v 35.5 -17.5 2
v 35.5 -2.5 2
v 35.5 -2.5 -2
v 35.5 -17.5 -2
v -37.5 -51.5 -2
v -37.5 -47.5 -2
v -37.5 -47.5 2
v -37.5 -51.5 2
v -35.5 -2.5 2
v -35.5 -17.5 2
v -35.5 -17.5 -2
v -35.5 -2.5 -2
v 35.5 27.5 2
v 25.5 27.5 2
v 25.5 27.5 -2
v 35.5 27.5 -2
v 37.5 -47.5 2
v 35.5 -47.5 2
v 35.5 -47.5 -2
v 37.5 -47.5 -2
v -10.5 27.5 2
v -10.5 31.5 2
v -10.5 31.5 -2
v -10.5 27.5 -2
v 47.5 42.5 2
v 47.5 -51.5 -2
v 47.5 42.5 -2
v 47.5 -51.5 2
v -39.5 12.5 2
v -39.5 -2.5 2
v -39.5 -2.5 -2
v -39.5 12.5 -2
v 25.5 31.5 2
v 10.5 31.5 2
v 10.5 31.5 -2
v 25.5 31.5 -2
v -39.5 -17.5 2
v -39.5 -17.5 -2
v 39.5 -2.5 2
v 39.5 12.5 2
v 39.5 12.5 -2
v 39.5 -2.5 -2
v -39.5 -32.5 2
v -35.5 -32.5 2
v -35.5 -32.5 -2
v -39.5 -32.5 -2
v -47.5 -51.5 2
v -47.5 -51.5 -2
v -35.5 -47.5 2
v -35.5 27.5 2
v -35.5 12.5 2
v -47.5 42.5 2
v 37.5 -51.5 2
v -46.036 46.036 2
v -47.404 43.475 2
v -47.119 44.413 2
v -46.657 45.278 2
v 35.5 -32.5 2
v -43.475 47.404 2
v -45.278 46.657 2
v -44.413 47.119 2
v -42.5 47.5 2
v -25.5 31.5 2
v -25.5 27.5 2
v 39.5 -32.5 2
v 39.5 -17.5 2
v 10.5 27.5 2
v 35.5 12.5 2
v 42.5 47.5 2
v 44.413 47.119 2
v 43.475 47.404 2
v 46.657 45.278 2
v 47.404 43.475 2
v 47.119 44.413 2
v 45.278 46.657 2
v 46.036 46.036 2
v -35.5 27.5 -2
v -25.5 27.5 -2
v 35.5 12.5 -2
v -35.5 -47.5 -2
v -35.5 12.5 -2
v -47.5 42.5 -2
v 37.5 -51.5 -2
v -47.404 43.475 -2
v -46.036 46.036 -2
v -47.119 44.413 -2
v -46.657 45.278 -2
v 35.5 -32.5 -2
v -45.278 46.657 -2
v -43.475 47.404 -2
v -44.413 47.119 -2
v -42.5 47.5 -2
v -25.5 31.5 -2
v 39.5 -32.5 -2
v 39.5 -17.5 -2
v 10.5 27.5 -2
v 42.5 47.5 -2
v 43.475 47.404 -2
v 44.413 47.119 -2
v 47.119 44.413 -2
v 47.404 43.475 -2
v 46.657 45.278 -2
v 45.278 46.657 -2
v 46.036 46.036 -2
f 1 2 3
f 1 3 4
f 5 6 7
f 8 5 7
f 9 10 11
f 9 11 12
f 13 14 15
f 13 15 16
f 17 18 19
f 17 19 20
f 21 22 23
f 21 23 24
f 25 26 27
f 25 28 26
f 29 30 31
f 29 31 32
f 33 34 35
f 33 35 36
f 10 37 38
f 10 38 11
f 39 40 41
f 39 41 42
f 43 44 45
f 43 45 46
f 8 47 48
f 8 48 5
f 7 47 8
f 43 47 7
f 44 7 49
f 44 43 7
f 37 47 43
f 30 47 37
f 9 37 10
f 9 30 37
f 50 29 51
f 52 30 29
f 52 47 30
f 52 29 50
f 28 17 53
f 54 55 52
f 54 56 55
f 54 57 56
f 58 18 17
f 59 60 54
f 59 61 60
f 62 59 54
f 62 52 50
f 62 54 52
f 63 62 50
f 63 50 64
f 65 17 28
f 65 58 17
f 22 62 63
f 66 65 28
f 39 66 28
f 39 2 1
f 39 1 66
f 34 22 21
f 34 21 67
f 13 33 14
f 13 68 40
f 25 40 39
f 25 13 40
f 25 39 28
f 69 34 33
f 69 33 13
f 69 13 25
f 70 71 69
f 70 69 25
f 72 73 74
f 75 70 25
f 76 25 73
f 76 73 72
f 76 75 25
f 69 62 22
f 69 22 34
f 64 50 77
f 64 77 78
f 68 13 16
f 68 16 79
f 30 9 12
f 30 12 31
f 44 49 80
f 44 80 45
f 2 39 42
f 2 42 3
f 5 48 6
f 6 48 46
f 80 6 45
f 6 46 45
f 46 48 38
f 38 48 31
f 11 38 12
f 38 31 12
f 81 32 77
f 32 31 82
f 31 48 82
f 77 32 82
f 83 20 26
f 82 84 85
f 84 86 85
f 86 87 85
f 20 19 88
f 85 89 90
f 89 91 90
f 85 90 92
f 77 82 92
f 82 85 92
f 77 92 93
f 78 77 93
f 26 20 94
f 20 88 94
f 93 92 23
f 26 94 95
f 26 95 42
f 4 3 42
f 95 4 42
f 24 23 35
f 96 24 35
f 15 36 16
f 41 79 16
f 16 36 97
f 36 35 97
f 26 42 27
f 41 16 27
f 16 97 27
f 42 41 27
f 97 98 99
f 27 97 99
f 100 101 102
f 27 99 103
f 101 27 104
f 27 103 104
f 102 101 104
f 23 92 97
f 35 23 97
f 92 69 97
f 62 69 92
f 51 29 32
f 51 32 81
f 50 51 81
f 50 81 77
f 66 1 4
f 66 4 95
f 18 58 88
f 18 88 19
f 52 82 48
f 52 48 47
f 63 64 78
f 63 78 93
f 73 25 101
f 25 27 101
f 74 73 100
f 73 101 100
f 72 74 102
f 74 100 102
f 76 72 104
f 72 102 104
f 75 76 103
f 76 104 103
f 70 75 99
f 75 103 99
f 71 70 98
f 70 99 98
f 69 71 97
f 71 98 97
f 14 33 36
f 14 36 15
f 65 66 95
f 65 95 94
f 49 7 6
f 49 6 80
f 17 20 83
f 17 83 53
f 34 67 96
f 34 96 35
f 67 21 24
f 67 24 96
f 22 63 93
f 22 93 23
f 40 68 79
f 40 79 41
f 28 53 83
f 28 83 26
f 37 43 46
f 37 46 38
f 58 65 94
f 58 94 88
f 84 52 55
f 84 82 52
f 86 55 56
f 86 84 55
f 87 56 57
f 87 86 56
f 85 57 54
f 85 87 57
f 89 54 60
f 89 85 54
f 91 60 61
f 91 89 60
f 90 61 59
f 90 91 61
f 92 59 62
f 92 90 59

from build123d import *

# Parameters (mm, degrees)
BOSS_EXTRUDE1_DEPTH = 2
SKETCH2_W           = 10
SKETCH2_H           = 4
BOSS_EXTRUDE2_DEPTH = 4
FILLET1_R           = 5


with BuildPart() as part:
    # Sketch1 → Boss-Extrude1 (new, symmetric)
    with BuildSketch(Plane.XY):
        Polygon((-47.5, -47.5), (-35.5, -47.5), (-35.5, -32.5), (-39.5, -32.5), (-39.5, -17.5), (-35.5, -17.5), (-35.5, -2.5), (-39.5, -2.5), (-39.5, 12.5), (-35.5, 12.5), (-35.5, 27.5), (-25.5, 27.5), (-25.5, 31.5), (-10.5, 31.5), (-10.5, 27.5), (10.5, 27.5), (10.5, 31.5), (25.5, 31.5), (25.5, 27.5), (35.5, 27.5), (35.5, 12.5), (39.5, 12.5), (39.5, -2.5), (35.5, -2.5), (35.5, -17.5), (39.5, -17.5), (39.5, -32.5), (35.5, -32.5), (35.5, -47.5), (47.5, -47.5), (47.5, 47.5), (-47.5, 47.5), align=None)
    extrude(amount=BOSS_EXTRUDE1_DEPTH, both=True)

    # Sketch2 → Boss-Extrude2 (add)
    with BuildSketch(Plane.XZ.offset(47.5)):
        with Locations((-42.5, 0)):
            Rectangle(SKETCH2_W, SKETCH2_H)
        with Locations((42.5, 0)):
            Rectangle(SKETCH2_W, SKETCH2_H)
    extrude(amount=BOSS_EXTRUDE2_DEPTH)

    # Fillet1
    fillet1_edges = [part.edges().sort_by_distance(p)[0] for p in [
        (-47.5, 47.5, 0),
        (47.5, 47.5, 0),
    ]]
    fillet(fillet1_edges, radius=FILLET1_R)


solid = part.part
